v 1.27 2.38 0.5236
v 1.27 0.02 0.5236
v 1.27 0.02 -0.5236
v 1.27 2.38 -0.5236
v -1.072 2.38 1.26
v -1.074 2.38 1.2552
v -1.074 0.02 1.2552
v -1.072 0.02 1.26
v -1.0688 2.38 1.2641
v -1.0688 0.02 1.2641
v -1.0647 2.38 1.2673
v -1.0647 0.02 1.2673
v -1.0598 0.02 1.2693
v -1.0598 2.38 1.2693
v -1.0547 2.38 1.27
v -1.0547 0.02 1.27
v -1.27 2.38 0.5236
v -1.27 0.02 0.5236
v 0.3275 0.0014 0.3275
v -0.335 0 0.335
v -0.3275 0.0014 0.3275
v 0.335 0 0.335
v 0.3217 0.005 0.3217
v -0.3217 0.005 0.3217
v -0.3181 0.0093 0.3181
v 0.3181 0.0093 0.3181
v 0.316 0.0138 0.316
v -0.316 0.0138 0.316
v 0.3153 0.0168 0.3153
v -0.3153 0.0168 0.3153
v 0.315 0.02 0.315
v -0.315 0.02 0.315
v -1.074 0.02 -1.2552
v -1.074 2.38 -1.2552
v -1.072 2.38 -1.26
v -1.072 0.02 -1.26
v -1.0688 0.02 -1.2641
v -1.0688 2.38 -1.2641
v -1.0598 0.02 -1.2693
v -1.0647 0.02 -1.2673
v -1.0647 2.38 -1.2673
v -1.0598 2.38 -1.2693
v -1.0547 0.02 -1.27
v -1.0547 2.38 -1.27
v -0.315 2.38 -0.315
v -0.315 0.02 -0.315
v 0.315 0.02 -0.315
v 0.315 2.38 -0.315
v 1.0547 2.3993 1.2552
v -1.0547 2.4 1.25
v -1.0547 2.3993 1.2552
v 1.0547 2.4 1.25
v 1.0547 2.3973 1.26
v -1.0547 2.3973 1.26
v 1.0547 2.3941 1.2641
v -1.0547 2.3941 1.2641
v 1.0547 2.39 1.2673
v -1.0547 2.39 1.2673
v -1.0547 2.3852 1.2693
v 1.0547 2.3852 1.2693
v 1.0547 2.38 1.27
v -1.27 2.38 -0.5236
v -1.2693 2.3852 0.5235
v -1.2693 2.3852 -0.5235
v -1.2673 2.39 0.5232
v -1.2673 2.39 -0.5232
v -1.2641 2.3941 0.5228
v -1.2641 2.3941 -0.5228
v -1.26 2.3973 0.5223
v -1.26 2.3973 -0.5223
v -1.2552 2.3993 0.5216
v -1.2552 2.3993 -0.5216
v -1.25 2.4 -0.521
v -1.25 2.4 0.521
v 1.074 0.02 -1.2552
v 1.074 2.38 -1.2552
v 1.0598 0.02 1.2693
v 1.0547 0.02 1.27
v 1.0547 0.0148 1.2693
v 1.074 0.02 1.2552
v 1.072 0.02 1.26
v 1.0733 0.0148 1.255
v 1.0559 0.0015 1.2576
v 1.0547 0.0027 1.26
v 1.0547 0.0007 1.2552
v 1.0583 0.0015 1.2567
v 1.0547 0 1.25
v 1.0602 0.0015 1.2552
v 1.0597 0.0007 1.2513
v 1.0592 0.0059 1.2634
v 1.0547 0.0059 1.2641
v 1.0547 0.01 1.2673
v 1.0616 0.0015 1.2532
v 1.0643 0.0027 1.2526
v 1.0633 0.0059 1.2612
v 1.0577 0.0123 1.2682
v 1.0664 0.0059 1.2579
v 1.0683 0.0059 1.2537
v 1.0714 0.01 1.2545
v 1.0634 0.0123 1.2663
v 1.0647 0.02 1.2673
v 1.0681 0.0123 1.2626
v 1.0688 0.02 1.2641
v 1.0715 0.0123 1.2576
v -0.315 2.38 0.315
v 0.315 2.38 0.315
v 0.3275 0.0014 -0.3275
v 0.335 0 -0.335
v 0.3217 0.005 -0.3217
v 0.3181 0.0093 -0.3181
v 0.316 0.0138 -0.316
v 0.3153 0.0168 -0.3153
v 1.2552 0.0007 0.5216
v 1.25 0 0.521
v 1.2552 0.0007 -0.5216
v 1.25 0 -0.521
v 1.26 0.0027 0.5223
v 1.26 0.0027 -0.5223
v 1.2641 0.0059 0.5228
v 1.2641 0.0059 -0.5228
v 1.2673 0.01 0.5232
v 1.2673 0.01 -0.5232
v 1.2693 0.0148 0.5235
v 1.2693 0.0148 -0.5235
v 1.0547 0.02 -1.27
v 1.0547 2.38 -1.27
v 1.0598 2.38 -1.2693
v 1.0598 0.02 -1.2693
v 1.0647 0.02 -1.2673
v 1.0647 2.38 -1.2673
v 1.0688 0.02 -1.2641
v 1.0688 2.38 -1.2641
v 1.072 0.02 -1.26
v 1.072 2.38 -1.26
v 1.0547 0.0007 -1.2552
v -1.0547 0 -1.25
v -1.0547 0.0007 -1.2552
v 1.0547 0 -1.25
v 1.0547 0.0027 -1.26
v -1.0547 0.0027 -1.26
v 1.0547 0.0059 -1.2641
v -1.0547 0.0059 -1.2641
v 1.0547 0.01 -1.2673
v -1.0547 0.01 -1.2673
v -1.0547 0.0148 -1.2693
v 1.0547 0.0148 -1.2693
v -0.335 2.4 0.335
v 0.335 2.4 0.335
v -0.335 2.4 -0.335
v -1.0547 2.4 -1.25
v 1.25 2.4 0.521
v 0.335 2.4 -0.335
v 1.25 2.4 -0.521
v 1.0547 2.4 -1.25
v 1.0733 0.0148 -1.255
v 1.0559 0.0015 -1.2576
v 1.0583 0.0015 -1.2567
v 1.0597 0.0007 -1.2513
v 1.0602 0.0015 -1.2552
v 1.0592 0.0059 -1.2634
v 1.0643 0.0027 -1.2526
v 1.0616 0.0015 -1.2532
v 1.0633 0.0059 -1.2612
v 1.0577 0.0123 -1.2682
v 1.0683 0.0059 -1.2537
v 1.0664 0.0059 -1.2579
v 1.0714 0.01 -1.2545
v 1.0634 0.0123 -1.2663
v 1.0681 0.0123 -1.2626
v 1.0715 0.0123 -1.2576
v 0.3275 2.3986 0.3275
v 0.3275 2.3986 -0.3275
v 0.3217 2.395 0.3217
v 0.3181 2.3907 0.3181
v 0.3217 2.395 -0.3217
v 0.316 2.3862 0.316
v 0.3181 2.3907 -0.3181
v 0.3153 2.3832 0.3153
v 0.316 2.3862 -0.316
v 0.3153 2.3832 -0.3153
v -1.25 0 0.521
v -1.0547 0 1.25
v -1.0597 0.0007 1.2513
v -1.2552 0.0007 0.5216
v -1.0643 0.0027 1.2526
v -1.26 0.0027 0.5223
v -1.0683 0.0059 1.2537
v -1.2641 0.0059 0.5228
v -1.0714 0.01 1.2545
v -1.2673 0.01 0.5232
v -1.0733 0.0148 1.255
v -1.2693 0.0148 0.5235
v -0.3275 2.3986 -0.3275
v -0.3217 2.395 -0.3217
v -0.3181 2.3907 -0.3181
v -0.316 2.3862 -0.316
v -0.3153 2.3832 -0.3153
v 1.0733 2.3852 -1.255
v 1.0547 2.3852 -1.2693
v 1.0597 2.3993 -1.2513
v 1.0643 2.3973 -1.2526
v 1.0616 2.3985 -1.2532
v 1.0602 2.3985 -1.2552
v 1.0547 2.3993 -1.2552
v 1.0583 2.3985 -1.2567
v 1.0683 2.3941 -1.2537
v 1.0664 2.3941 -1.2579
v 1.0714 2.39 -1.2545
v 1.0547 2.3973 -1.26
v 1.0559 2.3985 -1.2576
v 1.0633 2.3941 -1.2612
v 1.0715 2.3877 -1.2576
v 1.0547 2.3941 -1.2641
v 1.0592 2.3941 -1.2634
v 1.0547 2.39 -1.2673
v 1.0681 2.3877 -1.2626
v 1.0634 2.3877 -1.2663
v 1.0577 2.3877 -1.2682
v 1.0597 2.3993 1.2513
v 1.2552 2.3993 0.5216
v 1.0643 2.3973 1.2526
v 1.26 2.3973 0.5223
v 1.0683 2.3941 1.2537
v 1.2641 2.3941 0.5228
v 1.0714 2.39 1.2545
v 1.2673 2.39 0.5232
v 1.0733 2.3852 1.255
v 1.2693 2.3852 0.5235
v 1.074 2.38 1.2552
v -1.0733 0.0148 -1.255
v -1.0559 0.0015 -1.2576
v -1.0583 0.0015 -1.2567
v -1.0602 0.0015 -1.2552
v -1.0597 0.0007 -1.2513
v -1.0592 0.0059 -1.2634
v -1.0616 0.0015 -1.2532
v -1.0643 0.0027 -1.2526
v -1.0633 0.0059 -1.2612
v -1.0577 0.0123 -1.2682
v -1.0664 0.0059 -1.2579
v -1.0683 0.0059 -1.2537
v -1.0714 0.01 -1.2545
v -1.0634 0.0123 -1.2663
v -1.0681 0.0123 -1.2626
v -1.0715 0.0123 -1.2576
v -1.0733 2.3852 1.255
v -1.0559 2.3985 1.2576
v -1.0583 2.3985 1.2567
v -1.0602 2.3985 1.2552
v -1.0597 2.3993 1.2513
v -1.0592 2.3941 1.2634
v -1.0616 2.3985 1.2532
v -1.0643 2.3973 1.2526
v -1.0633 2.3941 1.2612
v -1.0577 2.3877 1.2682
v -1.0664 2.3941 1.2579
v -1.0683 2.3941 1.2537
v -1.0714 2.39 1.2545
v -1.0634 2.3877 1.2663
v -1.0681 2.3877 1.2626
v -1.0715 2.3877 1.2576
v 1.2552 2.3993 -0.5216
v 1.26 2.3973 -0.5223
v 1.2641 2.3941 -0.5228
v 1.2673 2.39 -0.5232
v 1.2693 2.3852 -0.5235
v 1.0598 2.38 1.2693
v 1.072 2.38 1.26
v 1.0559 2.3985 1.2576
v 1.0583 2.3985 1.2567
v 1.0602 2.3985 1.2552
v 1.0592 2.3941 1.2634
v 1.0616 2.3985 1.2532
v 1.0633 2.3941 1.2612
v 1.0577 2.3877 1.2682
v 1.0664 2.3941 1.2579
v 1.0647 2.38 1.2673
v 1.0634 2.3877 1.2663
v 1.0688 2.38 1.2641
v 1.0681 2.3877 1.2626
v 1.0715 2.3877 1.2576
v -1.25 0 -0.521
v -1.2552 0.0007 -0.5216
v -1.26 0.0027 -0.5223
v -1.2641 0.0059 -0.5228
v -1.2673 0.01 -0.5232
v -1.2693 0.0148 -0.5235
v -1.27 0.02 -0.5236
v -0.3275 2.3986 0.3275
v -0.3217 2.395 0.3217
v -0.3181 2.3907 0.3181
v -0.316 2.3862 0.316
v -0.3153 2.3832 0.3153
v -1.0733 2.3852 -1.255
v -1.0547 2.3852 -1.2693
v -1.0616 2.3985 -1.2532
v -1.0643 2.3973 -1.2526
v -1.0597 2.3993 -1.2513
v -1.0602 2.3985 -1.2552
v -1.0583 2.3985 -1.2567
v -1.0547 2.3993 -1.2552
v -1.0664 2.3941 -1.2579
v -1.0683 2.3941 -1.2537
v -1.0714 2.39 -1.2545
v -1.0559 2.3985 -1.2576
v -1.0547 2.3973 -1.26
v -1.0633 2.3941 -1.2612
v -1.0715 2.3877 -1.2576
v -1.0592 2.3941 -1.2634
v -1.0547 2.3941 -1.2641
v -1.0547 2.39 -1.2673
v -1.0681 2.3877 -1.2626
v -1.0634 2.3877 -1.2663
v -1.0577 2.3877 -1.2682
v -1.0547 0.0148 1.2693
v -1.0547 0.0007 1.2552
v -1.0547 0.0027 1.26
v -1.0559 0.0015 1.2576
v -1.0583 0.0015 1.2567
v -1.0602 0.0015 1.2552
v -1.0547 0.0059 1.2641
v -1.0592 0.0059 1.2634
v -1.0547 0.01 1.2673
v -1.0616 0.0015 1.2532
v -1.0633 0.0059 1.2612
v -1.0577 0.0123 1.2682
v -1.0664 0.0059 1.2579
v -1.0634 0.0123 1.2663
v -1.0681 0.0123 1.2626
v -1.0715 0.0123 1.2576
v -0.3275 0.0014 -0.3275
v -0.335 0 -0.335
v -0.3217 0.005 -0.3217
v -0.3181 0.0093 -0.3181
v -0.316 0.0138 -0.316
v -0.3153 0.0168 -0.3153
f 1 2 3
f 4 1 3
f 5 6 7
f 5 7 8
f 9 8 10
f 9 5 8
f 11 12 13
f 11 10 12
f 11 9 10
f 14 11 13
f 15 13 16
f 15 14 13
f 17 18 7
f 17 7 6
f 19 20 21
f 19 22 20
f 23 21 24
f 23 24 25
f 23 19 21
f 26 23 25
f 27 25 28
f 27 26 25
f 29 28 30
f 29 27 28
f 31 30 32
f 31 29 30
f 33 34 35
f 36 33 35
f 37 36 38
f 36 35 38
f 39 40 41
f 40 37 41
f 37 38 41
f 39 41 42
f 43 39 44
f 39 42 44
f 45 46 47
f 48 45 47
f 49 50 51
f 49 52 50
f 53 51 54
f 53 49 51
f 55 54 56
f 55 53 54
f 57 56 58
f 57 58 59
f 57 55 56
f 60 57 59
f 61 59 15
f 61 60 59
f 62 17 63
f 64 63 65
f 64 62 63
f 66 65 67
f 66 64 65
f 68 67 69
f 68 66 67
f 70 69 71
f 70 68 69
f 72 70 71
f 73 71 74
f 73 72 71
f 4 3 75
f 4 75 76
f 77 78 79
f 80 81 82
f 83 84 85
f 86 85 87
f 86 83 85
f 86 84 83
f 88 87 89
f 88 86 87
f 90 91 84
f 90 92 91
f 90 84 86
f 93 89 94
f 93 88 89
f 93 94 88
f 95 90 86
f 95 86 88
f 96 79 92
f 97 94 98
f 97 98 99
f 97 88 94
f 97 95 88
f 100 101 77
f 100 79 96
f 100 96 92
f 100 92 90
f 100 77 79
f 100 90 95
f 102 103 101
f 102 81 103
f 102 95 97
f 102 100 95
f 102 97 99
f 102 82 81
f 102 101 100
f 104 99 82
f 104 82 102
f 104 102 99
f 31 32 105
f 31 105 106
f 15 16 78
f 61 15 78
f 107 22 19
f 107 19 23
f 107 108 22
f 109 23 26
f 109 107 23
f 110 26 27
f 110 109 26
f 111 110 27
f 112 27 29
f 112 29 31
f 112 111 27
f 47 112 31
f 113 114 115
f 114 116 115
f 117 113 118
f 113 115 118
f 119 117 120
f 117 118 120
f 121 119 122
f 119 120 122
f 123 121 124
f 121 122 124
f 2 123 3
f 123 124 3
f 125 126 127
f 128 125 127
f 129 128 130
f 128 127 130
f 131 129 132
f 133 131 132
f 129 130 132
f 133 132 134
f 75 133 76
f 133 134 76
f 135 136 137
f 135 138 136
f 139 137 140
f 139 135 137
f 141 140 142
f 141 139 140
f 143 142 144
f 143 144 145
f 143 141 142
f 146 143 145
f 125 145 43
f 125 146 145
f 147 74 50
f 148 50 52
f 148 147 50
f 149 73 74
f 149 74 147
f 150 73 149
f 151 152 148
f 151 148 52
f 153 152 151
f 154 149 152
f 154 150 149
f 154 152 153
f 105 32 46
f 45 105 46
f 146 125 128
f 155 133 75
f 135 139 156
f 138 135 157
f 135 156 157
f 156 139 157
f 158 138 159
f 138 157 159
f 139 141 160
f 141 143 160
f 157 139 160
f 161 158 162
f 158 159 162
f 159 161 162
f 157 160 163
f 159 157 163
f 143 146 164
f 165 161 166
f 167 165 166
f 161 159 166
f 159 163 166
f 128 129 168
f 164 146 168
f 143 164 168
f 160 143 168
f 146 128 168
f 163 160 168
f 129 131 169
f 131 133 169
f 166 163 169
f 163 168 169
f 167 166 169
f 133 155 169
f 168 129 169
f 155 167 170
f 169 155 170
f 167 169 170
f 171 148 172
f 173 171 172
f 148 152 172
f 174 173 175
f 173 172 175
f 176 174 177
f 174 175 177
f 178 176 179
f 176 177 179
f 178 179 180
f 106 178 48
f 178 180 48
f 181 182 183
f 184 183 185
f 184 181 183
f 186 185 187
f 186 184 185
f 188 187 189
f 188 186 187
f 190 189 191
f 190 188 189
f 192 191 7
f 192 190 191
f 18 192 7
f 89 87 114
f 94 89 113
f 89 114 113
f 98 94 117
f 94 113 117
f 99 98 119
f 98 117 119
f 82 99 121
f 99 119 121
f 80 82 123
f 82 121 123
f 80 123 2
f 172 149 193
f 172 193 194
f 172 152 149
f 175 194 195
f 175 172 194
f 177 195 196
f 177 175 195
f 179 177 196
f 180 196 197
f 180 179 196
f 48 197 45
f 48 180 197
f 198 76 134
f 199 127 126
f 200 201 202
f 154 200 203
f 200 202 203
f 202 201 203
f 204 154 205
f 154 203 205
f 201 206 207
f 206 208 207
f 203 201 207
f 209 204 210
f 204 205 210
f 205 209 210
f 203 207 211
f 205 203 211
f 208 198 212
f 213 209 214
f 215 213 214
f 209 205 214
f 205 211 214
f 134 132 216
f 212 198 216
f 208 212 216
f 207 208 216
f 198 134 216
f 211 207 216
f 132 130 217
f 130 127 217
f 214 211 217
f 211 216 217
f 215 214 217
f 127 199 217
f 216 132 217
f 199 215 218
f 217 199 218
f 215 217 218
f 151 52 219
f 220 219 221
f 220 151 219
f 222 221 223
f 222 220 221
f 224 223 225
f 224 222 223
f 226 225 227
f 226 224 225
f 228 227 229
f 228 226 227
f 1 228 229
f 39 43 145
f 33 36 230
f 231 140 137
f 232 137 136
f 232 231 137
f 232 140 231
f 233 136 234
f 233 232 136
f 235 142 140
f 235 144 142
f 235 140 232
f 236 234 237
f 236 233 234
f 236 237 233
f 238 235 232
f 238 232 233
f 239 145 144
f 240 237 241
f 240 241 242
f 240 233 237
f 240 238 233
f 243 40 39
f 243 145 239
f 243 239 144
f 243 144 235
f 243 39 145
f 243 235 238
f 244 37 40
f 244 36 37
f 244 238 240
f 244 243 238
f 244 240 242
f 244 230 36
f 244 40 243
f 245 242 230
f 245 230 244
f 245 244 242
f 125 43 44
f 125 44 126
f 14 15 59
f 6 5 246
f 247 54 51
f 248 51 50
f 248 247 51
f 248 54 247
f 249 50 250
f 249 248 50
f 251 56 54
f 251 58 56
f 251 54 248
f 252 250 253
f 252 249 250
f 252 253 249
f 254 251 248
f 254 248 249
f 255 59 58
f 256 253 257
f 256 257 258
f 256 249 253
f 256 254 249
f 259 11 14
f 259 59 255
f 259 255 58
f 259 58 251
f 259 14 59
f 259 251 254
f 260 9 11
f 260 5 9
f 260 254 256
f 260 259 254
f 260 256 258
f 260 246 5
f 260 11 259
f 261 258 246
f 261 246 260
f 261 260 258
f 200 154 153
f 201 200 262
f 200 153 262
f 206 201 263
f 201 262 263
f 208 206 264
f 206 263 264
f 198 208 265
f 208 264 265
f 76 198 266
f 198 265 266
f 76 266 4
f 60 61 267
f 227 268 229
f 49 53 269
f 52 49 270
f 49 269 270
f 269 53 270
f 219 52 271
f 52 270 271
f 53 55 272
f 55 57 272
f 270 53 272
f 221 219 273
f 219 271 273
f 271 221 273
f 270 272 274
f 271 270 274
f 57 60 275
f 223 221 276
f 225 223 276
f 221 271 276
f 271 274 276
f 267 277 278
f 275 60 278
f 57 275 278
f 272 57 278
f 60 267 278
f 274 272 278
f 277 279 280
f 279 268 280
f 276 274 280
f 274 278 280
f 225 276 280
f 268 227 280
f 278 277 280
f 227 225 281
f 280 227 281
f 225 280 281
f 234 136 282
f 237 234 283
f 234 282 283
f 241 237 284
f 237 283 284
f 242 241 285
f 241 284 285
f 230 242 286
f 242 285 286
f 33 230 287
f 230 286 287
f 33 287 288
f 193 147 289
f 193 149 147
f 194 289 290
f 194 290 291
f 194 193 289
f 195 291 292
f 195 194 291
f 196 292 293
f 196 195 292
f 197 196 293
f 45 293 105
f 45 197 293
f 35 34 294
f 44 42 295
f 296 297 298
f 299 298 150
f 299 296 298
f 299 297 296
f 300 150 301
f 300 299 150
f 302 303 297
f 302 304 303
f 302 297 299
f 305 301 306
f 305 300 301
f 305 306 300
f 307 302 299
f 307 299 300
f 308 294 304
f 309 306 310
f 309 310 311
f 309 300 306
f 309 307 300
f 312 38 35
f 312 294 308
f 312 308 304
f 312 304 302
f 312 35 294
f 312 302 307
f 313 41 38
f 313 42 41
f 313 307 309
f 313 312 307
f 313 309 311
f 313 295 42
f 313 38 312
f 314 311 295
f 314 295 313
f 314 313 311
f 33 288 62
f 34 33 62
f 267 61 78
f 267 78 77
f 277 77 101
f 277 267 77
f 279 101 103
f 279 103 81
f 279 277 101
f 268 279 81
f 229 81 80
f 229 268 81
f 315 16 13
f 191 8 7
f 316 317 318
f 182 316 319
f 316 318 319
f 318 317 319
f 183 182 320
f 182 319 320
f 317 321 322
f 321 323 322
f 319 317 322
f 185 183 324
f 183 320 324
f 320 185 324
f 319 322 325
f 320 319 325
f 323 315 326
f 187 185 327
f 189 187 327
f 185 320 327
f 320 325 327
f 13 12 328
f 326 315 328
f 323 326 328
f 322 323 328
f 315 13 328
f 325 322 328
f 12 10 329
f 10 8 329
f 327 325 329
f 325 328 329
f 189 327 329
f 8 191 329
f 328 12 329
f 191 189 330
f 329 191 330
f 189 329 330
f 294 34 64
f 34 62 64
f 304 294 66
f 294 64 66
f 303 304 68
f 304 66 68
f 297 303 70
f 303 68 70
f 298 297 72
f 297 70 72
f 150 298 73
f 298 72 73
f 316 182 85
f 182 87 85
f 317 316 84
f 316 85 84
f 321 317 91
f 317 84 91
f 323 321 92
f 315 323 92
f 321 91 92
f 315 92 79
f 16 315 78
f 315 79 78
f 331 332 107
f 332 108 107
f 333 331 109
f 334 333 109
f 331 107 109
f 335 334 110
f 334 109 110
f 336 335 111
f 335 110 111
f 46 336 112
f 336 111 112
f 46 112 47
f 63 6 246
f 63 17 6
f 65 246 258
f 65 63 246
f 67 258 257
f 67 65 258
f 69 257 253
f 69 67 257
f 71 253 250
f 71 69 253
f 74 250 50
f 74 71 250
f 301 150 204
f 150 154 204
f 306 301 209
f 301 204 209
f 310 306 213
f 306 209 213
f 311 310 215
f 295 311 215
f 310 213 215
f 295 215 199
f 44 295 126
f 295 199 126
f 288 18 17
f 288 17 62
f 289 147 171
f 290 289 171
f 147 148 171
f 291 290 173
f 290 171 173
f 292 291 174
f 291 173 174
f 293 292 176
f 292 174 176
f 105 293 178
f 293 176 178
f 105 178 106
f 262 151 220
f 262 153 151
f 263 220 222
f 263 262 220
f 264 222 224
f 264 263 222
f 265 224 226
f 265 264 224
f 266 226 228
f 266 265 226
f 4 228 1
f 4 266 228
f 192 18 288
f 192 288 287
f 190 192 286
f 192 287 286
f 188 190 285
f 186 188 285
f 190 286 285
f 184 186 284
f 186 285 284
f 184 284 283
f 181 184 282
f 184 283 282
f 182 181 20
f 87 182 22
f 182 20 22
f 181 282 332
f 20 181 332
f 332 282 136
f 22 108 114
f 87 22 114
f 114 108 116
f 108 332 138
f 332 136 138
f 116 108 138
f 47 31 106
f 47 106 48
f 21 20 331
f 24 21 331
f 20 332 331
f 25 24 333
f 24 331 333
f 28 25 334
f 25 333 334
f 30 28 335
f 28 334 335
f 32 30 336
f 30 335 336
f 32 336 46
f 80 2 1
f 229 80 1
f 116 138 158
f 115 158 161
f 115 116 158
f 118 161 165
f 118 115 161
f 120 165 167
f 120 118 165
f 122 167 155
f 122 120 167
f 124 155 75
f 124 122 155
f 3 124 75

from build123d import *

# Parameters (mm, degrees)
SKETCH1_W             = 2.54
SKETCH1_H             = 2.54
SKETCH1_W_2           = 0.63
SKETCH1_H_2           = 0.63
BOSS_EXTRUDE1_DEPTH   = 2.4
CHAMFER1_SIZE         = 0.2
CHAMFER1_SIZE2        = 0.746410162
CHAMFER1_PART_2_SIZE  = 0.2
CHAMFER1_PART_2_SIZE2 = 0.746410162
FILLET1_R             = 0.02


with BuildPart() as part:
    # Sketch1 → Boss-Extrude1 (new body)
    with BuildSketch(Plane(origin=(0, 0, 0), x_dir=(1, 0, 0), z_dir=(0, 1, 0))):
        Rectangle(SKETCH1_W, SKETCH1_H)
        Rectangle(SKETCH1_W_2, SKETCH1_H_2, mode=Mode.SUBTRACT)
    extrude(amount=BOSS_EXTRUDE1_DEPTH)

    # Chamfer1
    chamfer1_edges = [part.edges().sort_by_distance(p)[0] for p in [
        (1.27, 1.2, 1.27),
        (-1.27, 1.2, 1.27),
    ]]
    chamfer1_side = [part.faces().sort_by_distance(p)[0] for p in [
        (0, 1.2, 1.27),
    ]]
    chamfer(chamfer1_edges, length=CHAMFER1_SIZE, length2=CHAMFER1_SIZE2, reference=chamfer1_side[0])

    # Chamfer1 part 2
    chamfer1_part_2_edges = [part.edges().sort_by_distance(p)[0] for p in [
        (-1.27, 1.2, -1.27),
        (1.27, 1.2, -1.27),
    ]]
    chamfer1_part_2_side = [part.faces().sort_by_distance(p)[0] for p in [
        (0, 1.2, -1.27),
    ]]
    chamfer(chamfer1_part_2_edges, length=CHAMFER1_PART_2_SIZE, length2=CHAMFER1_PART_2_SIZE2, reference=chamfer1_part_2_side[0])

    # Fillet1
    fillet1_edges = [part.edges().sort_by_distance(p)[0] for p in [
        (0.315, 0, 0),
        (0, 0, -0.315),
        (-0.315, 0, 0),
        (0, 0, 0.315),
        (0.315, 2.4, 0),
        (0, 2.4, -0.315),
        (-0.315, 2.4, 0),
        (0, 2.4, 0.315),
        (-1.27, 0, 0),
        (-1.27, 2.4, 0),
        (1.27, 0, 0),
        (0, 0, 1.27),
        (0, 0, -1.27),
        (1.17, 0, 0.896794919),
        (-1.17, 0, 0.896794919),
        (1.17, 0, -0.896794919),
        (-1.17, 0, -0.896794919),
        (0, 2.4, -1.27),
        (1.07, 1.2, -1.27),
        (-1.07, 1.2, -1.27),
        (1.27, 2.4, 0),
        (0, 2.4, 1.27),
        (1.17, 2.4, 0.896794919),
        (-1.17, 2.4, 0.896794919),
        (1.17, 2.4, -0.896794919),
        (-1.17, 2.4, -0.896794919),
        (1.07, 1.2, 1.27),
        (-1.07, 1.2, 1.27),
    ]]
    fillet(fillet1_edges, radius=FILLET1_R)


solid = part.part
